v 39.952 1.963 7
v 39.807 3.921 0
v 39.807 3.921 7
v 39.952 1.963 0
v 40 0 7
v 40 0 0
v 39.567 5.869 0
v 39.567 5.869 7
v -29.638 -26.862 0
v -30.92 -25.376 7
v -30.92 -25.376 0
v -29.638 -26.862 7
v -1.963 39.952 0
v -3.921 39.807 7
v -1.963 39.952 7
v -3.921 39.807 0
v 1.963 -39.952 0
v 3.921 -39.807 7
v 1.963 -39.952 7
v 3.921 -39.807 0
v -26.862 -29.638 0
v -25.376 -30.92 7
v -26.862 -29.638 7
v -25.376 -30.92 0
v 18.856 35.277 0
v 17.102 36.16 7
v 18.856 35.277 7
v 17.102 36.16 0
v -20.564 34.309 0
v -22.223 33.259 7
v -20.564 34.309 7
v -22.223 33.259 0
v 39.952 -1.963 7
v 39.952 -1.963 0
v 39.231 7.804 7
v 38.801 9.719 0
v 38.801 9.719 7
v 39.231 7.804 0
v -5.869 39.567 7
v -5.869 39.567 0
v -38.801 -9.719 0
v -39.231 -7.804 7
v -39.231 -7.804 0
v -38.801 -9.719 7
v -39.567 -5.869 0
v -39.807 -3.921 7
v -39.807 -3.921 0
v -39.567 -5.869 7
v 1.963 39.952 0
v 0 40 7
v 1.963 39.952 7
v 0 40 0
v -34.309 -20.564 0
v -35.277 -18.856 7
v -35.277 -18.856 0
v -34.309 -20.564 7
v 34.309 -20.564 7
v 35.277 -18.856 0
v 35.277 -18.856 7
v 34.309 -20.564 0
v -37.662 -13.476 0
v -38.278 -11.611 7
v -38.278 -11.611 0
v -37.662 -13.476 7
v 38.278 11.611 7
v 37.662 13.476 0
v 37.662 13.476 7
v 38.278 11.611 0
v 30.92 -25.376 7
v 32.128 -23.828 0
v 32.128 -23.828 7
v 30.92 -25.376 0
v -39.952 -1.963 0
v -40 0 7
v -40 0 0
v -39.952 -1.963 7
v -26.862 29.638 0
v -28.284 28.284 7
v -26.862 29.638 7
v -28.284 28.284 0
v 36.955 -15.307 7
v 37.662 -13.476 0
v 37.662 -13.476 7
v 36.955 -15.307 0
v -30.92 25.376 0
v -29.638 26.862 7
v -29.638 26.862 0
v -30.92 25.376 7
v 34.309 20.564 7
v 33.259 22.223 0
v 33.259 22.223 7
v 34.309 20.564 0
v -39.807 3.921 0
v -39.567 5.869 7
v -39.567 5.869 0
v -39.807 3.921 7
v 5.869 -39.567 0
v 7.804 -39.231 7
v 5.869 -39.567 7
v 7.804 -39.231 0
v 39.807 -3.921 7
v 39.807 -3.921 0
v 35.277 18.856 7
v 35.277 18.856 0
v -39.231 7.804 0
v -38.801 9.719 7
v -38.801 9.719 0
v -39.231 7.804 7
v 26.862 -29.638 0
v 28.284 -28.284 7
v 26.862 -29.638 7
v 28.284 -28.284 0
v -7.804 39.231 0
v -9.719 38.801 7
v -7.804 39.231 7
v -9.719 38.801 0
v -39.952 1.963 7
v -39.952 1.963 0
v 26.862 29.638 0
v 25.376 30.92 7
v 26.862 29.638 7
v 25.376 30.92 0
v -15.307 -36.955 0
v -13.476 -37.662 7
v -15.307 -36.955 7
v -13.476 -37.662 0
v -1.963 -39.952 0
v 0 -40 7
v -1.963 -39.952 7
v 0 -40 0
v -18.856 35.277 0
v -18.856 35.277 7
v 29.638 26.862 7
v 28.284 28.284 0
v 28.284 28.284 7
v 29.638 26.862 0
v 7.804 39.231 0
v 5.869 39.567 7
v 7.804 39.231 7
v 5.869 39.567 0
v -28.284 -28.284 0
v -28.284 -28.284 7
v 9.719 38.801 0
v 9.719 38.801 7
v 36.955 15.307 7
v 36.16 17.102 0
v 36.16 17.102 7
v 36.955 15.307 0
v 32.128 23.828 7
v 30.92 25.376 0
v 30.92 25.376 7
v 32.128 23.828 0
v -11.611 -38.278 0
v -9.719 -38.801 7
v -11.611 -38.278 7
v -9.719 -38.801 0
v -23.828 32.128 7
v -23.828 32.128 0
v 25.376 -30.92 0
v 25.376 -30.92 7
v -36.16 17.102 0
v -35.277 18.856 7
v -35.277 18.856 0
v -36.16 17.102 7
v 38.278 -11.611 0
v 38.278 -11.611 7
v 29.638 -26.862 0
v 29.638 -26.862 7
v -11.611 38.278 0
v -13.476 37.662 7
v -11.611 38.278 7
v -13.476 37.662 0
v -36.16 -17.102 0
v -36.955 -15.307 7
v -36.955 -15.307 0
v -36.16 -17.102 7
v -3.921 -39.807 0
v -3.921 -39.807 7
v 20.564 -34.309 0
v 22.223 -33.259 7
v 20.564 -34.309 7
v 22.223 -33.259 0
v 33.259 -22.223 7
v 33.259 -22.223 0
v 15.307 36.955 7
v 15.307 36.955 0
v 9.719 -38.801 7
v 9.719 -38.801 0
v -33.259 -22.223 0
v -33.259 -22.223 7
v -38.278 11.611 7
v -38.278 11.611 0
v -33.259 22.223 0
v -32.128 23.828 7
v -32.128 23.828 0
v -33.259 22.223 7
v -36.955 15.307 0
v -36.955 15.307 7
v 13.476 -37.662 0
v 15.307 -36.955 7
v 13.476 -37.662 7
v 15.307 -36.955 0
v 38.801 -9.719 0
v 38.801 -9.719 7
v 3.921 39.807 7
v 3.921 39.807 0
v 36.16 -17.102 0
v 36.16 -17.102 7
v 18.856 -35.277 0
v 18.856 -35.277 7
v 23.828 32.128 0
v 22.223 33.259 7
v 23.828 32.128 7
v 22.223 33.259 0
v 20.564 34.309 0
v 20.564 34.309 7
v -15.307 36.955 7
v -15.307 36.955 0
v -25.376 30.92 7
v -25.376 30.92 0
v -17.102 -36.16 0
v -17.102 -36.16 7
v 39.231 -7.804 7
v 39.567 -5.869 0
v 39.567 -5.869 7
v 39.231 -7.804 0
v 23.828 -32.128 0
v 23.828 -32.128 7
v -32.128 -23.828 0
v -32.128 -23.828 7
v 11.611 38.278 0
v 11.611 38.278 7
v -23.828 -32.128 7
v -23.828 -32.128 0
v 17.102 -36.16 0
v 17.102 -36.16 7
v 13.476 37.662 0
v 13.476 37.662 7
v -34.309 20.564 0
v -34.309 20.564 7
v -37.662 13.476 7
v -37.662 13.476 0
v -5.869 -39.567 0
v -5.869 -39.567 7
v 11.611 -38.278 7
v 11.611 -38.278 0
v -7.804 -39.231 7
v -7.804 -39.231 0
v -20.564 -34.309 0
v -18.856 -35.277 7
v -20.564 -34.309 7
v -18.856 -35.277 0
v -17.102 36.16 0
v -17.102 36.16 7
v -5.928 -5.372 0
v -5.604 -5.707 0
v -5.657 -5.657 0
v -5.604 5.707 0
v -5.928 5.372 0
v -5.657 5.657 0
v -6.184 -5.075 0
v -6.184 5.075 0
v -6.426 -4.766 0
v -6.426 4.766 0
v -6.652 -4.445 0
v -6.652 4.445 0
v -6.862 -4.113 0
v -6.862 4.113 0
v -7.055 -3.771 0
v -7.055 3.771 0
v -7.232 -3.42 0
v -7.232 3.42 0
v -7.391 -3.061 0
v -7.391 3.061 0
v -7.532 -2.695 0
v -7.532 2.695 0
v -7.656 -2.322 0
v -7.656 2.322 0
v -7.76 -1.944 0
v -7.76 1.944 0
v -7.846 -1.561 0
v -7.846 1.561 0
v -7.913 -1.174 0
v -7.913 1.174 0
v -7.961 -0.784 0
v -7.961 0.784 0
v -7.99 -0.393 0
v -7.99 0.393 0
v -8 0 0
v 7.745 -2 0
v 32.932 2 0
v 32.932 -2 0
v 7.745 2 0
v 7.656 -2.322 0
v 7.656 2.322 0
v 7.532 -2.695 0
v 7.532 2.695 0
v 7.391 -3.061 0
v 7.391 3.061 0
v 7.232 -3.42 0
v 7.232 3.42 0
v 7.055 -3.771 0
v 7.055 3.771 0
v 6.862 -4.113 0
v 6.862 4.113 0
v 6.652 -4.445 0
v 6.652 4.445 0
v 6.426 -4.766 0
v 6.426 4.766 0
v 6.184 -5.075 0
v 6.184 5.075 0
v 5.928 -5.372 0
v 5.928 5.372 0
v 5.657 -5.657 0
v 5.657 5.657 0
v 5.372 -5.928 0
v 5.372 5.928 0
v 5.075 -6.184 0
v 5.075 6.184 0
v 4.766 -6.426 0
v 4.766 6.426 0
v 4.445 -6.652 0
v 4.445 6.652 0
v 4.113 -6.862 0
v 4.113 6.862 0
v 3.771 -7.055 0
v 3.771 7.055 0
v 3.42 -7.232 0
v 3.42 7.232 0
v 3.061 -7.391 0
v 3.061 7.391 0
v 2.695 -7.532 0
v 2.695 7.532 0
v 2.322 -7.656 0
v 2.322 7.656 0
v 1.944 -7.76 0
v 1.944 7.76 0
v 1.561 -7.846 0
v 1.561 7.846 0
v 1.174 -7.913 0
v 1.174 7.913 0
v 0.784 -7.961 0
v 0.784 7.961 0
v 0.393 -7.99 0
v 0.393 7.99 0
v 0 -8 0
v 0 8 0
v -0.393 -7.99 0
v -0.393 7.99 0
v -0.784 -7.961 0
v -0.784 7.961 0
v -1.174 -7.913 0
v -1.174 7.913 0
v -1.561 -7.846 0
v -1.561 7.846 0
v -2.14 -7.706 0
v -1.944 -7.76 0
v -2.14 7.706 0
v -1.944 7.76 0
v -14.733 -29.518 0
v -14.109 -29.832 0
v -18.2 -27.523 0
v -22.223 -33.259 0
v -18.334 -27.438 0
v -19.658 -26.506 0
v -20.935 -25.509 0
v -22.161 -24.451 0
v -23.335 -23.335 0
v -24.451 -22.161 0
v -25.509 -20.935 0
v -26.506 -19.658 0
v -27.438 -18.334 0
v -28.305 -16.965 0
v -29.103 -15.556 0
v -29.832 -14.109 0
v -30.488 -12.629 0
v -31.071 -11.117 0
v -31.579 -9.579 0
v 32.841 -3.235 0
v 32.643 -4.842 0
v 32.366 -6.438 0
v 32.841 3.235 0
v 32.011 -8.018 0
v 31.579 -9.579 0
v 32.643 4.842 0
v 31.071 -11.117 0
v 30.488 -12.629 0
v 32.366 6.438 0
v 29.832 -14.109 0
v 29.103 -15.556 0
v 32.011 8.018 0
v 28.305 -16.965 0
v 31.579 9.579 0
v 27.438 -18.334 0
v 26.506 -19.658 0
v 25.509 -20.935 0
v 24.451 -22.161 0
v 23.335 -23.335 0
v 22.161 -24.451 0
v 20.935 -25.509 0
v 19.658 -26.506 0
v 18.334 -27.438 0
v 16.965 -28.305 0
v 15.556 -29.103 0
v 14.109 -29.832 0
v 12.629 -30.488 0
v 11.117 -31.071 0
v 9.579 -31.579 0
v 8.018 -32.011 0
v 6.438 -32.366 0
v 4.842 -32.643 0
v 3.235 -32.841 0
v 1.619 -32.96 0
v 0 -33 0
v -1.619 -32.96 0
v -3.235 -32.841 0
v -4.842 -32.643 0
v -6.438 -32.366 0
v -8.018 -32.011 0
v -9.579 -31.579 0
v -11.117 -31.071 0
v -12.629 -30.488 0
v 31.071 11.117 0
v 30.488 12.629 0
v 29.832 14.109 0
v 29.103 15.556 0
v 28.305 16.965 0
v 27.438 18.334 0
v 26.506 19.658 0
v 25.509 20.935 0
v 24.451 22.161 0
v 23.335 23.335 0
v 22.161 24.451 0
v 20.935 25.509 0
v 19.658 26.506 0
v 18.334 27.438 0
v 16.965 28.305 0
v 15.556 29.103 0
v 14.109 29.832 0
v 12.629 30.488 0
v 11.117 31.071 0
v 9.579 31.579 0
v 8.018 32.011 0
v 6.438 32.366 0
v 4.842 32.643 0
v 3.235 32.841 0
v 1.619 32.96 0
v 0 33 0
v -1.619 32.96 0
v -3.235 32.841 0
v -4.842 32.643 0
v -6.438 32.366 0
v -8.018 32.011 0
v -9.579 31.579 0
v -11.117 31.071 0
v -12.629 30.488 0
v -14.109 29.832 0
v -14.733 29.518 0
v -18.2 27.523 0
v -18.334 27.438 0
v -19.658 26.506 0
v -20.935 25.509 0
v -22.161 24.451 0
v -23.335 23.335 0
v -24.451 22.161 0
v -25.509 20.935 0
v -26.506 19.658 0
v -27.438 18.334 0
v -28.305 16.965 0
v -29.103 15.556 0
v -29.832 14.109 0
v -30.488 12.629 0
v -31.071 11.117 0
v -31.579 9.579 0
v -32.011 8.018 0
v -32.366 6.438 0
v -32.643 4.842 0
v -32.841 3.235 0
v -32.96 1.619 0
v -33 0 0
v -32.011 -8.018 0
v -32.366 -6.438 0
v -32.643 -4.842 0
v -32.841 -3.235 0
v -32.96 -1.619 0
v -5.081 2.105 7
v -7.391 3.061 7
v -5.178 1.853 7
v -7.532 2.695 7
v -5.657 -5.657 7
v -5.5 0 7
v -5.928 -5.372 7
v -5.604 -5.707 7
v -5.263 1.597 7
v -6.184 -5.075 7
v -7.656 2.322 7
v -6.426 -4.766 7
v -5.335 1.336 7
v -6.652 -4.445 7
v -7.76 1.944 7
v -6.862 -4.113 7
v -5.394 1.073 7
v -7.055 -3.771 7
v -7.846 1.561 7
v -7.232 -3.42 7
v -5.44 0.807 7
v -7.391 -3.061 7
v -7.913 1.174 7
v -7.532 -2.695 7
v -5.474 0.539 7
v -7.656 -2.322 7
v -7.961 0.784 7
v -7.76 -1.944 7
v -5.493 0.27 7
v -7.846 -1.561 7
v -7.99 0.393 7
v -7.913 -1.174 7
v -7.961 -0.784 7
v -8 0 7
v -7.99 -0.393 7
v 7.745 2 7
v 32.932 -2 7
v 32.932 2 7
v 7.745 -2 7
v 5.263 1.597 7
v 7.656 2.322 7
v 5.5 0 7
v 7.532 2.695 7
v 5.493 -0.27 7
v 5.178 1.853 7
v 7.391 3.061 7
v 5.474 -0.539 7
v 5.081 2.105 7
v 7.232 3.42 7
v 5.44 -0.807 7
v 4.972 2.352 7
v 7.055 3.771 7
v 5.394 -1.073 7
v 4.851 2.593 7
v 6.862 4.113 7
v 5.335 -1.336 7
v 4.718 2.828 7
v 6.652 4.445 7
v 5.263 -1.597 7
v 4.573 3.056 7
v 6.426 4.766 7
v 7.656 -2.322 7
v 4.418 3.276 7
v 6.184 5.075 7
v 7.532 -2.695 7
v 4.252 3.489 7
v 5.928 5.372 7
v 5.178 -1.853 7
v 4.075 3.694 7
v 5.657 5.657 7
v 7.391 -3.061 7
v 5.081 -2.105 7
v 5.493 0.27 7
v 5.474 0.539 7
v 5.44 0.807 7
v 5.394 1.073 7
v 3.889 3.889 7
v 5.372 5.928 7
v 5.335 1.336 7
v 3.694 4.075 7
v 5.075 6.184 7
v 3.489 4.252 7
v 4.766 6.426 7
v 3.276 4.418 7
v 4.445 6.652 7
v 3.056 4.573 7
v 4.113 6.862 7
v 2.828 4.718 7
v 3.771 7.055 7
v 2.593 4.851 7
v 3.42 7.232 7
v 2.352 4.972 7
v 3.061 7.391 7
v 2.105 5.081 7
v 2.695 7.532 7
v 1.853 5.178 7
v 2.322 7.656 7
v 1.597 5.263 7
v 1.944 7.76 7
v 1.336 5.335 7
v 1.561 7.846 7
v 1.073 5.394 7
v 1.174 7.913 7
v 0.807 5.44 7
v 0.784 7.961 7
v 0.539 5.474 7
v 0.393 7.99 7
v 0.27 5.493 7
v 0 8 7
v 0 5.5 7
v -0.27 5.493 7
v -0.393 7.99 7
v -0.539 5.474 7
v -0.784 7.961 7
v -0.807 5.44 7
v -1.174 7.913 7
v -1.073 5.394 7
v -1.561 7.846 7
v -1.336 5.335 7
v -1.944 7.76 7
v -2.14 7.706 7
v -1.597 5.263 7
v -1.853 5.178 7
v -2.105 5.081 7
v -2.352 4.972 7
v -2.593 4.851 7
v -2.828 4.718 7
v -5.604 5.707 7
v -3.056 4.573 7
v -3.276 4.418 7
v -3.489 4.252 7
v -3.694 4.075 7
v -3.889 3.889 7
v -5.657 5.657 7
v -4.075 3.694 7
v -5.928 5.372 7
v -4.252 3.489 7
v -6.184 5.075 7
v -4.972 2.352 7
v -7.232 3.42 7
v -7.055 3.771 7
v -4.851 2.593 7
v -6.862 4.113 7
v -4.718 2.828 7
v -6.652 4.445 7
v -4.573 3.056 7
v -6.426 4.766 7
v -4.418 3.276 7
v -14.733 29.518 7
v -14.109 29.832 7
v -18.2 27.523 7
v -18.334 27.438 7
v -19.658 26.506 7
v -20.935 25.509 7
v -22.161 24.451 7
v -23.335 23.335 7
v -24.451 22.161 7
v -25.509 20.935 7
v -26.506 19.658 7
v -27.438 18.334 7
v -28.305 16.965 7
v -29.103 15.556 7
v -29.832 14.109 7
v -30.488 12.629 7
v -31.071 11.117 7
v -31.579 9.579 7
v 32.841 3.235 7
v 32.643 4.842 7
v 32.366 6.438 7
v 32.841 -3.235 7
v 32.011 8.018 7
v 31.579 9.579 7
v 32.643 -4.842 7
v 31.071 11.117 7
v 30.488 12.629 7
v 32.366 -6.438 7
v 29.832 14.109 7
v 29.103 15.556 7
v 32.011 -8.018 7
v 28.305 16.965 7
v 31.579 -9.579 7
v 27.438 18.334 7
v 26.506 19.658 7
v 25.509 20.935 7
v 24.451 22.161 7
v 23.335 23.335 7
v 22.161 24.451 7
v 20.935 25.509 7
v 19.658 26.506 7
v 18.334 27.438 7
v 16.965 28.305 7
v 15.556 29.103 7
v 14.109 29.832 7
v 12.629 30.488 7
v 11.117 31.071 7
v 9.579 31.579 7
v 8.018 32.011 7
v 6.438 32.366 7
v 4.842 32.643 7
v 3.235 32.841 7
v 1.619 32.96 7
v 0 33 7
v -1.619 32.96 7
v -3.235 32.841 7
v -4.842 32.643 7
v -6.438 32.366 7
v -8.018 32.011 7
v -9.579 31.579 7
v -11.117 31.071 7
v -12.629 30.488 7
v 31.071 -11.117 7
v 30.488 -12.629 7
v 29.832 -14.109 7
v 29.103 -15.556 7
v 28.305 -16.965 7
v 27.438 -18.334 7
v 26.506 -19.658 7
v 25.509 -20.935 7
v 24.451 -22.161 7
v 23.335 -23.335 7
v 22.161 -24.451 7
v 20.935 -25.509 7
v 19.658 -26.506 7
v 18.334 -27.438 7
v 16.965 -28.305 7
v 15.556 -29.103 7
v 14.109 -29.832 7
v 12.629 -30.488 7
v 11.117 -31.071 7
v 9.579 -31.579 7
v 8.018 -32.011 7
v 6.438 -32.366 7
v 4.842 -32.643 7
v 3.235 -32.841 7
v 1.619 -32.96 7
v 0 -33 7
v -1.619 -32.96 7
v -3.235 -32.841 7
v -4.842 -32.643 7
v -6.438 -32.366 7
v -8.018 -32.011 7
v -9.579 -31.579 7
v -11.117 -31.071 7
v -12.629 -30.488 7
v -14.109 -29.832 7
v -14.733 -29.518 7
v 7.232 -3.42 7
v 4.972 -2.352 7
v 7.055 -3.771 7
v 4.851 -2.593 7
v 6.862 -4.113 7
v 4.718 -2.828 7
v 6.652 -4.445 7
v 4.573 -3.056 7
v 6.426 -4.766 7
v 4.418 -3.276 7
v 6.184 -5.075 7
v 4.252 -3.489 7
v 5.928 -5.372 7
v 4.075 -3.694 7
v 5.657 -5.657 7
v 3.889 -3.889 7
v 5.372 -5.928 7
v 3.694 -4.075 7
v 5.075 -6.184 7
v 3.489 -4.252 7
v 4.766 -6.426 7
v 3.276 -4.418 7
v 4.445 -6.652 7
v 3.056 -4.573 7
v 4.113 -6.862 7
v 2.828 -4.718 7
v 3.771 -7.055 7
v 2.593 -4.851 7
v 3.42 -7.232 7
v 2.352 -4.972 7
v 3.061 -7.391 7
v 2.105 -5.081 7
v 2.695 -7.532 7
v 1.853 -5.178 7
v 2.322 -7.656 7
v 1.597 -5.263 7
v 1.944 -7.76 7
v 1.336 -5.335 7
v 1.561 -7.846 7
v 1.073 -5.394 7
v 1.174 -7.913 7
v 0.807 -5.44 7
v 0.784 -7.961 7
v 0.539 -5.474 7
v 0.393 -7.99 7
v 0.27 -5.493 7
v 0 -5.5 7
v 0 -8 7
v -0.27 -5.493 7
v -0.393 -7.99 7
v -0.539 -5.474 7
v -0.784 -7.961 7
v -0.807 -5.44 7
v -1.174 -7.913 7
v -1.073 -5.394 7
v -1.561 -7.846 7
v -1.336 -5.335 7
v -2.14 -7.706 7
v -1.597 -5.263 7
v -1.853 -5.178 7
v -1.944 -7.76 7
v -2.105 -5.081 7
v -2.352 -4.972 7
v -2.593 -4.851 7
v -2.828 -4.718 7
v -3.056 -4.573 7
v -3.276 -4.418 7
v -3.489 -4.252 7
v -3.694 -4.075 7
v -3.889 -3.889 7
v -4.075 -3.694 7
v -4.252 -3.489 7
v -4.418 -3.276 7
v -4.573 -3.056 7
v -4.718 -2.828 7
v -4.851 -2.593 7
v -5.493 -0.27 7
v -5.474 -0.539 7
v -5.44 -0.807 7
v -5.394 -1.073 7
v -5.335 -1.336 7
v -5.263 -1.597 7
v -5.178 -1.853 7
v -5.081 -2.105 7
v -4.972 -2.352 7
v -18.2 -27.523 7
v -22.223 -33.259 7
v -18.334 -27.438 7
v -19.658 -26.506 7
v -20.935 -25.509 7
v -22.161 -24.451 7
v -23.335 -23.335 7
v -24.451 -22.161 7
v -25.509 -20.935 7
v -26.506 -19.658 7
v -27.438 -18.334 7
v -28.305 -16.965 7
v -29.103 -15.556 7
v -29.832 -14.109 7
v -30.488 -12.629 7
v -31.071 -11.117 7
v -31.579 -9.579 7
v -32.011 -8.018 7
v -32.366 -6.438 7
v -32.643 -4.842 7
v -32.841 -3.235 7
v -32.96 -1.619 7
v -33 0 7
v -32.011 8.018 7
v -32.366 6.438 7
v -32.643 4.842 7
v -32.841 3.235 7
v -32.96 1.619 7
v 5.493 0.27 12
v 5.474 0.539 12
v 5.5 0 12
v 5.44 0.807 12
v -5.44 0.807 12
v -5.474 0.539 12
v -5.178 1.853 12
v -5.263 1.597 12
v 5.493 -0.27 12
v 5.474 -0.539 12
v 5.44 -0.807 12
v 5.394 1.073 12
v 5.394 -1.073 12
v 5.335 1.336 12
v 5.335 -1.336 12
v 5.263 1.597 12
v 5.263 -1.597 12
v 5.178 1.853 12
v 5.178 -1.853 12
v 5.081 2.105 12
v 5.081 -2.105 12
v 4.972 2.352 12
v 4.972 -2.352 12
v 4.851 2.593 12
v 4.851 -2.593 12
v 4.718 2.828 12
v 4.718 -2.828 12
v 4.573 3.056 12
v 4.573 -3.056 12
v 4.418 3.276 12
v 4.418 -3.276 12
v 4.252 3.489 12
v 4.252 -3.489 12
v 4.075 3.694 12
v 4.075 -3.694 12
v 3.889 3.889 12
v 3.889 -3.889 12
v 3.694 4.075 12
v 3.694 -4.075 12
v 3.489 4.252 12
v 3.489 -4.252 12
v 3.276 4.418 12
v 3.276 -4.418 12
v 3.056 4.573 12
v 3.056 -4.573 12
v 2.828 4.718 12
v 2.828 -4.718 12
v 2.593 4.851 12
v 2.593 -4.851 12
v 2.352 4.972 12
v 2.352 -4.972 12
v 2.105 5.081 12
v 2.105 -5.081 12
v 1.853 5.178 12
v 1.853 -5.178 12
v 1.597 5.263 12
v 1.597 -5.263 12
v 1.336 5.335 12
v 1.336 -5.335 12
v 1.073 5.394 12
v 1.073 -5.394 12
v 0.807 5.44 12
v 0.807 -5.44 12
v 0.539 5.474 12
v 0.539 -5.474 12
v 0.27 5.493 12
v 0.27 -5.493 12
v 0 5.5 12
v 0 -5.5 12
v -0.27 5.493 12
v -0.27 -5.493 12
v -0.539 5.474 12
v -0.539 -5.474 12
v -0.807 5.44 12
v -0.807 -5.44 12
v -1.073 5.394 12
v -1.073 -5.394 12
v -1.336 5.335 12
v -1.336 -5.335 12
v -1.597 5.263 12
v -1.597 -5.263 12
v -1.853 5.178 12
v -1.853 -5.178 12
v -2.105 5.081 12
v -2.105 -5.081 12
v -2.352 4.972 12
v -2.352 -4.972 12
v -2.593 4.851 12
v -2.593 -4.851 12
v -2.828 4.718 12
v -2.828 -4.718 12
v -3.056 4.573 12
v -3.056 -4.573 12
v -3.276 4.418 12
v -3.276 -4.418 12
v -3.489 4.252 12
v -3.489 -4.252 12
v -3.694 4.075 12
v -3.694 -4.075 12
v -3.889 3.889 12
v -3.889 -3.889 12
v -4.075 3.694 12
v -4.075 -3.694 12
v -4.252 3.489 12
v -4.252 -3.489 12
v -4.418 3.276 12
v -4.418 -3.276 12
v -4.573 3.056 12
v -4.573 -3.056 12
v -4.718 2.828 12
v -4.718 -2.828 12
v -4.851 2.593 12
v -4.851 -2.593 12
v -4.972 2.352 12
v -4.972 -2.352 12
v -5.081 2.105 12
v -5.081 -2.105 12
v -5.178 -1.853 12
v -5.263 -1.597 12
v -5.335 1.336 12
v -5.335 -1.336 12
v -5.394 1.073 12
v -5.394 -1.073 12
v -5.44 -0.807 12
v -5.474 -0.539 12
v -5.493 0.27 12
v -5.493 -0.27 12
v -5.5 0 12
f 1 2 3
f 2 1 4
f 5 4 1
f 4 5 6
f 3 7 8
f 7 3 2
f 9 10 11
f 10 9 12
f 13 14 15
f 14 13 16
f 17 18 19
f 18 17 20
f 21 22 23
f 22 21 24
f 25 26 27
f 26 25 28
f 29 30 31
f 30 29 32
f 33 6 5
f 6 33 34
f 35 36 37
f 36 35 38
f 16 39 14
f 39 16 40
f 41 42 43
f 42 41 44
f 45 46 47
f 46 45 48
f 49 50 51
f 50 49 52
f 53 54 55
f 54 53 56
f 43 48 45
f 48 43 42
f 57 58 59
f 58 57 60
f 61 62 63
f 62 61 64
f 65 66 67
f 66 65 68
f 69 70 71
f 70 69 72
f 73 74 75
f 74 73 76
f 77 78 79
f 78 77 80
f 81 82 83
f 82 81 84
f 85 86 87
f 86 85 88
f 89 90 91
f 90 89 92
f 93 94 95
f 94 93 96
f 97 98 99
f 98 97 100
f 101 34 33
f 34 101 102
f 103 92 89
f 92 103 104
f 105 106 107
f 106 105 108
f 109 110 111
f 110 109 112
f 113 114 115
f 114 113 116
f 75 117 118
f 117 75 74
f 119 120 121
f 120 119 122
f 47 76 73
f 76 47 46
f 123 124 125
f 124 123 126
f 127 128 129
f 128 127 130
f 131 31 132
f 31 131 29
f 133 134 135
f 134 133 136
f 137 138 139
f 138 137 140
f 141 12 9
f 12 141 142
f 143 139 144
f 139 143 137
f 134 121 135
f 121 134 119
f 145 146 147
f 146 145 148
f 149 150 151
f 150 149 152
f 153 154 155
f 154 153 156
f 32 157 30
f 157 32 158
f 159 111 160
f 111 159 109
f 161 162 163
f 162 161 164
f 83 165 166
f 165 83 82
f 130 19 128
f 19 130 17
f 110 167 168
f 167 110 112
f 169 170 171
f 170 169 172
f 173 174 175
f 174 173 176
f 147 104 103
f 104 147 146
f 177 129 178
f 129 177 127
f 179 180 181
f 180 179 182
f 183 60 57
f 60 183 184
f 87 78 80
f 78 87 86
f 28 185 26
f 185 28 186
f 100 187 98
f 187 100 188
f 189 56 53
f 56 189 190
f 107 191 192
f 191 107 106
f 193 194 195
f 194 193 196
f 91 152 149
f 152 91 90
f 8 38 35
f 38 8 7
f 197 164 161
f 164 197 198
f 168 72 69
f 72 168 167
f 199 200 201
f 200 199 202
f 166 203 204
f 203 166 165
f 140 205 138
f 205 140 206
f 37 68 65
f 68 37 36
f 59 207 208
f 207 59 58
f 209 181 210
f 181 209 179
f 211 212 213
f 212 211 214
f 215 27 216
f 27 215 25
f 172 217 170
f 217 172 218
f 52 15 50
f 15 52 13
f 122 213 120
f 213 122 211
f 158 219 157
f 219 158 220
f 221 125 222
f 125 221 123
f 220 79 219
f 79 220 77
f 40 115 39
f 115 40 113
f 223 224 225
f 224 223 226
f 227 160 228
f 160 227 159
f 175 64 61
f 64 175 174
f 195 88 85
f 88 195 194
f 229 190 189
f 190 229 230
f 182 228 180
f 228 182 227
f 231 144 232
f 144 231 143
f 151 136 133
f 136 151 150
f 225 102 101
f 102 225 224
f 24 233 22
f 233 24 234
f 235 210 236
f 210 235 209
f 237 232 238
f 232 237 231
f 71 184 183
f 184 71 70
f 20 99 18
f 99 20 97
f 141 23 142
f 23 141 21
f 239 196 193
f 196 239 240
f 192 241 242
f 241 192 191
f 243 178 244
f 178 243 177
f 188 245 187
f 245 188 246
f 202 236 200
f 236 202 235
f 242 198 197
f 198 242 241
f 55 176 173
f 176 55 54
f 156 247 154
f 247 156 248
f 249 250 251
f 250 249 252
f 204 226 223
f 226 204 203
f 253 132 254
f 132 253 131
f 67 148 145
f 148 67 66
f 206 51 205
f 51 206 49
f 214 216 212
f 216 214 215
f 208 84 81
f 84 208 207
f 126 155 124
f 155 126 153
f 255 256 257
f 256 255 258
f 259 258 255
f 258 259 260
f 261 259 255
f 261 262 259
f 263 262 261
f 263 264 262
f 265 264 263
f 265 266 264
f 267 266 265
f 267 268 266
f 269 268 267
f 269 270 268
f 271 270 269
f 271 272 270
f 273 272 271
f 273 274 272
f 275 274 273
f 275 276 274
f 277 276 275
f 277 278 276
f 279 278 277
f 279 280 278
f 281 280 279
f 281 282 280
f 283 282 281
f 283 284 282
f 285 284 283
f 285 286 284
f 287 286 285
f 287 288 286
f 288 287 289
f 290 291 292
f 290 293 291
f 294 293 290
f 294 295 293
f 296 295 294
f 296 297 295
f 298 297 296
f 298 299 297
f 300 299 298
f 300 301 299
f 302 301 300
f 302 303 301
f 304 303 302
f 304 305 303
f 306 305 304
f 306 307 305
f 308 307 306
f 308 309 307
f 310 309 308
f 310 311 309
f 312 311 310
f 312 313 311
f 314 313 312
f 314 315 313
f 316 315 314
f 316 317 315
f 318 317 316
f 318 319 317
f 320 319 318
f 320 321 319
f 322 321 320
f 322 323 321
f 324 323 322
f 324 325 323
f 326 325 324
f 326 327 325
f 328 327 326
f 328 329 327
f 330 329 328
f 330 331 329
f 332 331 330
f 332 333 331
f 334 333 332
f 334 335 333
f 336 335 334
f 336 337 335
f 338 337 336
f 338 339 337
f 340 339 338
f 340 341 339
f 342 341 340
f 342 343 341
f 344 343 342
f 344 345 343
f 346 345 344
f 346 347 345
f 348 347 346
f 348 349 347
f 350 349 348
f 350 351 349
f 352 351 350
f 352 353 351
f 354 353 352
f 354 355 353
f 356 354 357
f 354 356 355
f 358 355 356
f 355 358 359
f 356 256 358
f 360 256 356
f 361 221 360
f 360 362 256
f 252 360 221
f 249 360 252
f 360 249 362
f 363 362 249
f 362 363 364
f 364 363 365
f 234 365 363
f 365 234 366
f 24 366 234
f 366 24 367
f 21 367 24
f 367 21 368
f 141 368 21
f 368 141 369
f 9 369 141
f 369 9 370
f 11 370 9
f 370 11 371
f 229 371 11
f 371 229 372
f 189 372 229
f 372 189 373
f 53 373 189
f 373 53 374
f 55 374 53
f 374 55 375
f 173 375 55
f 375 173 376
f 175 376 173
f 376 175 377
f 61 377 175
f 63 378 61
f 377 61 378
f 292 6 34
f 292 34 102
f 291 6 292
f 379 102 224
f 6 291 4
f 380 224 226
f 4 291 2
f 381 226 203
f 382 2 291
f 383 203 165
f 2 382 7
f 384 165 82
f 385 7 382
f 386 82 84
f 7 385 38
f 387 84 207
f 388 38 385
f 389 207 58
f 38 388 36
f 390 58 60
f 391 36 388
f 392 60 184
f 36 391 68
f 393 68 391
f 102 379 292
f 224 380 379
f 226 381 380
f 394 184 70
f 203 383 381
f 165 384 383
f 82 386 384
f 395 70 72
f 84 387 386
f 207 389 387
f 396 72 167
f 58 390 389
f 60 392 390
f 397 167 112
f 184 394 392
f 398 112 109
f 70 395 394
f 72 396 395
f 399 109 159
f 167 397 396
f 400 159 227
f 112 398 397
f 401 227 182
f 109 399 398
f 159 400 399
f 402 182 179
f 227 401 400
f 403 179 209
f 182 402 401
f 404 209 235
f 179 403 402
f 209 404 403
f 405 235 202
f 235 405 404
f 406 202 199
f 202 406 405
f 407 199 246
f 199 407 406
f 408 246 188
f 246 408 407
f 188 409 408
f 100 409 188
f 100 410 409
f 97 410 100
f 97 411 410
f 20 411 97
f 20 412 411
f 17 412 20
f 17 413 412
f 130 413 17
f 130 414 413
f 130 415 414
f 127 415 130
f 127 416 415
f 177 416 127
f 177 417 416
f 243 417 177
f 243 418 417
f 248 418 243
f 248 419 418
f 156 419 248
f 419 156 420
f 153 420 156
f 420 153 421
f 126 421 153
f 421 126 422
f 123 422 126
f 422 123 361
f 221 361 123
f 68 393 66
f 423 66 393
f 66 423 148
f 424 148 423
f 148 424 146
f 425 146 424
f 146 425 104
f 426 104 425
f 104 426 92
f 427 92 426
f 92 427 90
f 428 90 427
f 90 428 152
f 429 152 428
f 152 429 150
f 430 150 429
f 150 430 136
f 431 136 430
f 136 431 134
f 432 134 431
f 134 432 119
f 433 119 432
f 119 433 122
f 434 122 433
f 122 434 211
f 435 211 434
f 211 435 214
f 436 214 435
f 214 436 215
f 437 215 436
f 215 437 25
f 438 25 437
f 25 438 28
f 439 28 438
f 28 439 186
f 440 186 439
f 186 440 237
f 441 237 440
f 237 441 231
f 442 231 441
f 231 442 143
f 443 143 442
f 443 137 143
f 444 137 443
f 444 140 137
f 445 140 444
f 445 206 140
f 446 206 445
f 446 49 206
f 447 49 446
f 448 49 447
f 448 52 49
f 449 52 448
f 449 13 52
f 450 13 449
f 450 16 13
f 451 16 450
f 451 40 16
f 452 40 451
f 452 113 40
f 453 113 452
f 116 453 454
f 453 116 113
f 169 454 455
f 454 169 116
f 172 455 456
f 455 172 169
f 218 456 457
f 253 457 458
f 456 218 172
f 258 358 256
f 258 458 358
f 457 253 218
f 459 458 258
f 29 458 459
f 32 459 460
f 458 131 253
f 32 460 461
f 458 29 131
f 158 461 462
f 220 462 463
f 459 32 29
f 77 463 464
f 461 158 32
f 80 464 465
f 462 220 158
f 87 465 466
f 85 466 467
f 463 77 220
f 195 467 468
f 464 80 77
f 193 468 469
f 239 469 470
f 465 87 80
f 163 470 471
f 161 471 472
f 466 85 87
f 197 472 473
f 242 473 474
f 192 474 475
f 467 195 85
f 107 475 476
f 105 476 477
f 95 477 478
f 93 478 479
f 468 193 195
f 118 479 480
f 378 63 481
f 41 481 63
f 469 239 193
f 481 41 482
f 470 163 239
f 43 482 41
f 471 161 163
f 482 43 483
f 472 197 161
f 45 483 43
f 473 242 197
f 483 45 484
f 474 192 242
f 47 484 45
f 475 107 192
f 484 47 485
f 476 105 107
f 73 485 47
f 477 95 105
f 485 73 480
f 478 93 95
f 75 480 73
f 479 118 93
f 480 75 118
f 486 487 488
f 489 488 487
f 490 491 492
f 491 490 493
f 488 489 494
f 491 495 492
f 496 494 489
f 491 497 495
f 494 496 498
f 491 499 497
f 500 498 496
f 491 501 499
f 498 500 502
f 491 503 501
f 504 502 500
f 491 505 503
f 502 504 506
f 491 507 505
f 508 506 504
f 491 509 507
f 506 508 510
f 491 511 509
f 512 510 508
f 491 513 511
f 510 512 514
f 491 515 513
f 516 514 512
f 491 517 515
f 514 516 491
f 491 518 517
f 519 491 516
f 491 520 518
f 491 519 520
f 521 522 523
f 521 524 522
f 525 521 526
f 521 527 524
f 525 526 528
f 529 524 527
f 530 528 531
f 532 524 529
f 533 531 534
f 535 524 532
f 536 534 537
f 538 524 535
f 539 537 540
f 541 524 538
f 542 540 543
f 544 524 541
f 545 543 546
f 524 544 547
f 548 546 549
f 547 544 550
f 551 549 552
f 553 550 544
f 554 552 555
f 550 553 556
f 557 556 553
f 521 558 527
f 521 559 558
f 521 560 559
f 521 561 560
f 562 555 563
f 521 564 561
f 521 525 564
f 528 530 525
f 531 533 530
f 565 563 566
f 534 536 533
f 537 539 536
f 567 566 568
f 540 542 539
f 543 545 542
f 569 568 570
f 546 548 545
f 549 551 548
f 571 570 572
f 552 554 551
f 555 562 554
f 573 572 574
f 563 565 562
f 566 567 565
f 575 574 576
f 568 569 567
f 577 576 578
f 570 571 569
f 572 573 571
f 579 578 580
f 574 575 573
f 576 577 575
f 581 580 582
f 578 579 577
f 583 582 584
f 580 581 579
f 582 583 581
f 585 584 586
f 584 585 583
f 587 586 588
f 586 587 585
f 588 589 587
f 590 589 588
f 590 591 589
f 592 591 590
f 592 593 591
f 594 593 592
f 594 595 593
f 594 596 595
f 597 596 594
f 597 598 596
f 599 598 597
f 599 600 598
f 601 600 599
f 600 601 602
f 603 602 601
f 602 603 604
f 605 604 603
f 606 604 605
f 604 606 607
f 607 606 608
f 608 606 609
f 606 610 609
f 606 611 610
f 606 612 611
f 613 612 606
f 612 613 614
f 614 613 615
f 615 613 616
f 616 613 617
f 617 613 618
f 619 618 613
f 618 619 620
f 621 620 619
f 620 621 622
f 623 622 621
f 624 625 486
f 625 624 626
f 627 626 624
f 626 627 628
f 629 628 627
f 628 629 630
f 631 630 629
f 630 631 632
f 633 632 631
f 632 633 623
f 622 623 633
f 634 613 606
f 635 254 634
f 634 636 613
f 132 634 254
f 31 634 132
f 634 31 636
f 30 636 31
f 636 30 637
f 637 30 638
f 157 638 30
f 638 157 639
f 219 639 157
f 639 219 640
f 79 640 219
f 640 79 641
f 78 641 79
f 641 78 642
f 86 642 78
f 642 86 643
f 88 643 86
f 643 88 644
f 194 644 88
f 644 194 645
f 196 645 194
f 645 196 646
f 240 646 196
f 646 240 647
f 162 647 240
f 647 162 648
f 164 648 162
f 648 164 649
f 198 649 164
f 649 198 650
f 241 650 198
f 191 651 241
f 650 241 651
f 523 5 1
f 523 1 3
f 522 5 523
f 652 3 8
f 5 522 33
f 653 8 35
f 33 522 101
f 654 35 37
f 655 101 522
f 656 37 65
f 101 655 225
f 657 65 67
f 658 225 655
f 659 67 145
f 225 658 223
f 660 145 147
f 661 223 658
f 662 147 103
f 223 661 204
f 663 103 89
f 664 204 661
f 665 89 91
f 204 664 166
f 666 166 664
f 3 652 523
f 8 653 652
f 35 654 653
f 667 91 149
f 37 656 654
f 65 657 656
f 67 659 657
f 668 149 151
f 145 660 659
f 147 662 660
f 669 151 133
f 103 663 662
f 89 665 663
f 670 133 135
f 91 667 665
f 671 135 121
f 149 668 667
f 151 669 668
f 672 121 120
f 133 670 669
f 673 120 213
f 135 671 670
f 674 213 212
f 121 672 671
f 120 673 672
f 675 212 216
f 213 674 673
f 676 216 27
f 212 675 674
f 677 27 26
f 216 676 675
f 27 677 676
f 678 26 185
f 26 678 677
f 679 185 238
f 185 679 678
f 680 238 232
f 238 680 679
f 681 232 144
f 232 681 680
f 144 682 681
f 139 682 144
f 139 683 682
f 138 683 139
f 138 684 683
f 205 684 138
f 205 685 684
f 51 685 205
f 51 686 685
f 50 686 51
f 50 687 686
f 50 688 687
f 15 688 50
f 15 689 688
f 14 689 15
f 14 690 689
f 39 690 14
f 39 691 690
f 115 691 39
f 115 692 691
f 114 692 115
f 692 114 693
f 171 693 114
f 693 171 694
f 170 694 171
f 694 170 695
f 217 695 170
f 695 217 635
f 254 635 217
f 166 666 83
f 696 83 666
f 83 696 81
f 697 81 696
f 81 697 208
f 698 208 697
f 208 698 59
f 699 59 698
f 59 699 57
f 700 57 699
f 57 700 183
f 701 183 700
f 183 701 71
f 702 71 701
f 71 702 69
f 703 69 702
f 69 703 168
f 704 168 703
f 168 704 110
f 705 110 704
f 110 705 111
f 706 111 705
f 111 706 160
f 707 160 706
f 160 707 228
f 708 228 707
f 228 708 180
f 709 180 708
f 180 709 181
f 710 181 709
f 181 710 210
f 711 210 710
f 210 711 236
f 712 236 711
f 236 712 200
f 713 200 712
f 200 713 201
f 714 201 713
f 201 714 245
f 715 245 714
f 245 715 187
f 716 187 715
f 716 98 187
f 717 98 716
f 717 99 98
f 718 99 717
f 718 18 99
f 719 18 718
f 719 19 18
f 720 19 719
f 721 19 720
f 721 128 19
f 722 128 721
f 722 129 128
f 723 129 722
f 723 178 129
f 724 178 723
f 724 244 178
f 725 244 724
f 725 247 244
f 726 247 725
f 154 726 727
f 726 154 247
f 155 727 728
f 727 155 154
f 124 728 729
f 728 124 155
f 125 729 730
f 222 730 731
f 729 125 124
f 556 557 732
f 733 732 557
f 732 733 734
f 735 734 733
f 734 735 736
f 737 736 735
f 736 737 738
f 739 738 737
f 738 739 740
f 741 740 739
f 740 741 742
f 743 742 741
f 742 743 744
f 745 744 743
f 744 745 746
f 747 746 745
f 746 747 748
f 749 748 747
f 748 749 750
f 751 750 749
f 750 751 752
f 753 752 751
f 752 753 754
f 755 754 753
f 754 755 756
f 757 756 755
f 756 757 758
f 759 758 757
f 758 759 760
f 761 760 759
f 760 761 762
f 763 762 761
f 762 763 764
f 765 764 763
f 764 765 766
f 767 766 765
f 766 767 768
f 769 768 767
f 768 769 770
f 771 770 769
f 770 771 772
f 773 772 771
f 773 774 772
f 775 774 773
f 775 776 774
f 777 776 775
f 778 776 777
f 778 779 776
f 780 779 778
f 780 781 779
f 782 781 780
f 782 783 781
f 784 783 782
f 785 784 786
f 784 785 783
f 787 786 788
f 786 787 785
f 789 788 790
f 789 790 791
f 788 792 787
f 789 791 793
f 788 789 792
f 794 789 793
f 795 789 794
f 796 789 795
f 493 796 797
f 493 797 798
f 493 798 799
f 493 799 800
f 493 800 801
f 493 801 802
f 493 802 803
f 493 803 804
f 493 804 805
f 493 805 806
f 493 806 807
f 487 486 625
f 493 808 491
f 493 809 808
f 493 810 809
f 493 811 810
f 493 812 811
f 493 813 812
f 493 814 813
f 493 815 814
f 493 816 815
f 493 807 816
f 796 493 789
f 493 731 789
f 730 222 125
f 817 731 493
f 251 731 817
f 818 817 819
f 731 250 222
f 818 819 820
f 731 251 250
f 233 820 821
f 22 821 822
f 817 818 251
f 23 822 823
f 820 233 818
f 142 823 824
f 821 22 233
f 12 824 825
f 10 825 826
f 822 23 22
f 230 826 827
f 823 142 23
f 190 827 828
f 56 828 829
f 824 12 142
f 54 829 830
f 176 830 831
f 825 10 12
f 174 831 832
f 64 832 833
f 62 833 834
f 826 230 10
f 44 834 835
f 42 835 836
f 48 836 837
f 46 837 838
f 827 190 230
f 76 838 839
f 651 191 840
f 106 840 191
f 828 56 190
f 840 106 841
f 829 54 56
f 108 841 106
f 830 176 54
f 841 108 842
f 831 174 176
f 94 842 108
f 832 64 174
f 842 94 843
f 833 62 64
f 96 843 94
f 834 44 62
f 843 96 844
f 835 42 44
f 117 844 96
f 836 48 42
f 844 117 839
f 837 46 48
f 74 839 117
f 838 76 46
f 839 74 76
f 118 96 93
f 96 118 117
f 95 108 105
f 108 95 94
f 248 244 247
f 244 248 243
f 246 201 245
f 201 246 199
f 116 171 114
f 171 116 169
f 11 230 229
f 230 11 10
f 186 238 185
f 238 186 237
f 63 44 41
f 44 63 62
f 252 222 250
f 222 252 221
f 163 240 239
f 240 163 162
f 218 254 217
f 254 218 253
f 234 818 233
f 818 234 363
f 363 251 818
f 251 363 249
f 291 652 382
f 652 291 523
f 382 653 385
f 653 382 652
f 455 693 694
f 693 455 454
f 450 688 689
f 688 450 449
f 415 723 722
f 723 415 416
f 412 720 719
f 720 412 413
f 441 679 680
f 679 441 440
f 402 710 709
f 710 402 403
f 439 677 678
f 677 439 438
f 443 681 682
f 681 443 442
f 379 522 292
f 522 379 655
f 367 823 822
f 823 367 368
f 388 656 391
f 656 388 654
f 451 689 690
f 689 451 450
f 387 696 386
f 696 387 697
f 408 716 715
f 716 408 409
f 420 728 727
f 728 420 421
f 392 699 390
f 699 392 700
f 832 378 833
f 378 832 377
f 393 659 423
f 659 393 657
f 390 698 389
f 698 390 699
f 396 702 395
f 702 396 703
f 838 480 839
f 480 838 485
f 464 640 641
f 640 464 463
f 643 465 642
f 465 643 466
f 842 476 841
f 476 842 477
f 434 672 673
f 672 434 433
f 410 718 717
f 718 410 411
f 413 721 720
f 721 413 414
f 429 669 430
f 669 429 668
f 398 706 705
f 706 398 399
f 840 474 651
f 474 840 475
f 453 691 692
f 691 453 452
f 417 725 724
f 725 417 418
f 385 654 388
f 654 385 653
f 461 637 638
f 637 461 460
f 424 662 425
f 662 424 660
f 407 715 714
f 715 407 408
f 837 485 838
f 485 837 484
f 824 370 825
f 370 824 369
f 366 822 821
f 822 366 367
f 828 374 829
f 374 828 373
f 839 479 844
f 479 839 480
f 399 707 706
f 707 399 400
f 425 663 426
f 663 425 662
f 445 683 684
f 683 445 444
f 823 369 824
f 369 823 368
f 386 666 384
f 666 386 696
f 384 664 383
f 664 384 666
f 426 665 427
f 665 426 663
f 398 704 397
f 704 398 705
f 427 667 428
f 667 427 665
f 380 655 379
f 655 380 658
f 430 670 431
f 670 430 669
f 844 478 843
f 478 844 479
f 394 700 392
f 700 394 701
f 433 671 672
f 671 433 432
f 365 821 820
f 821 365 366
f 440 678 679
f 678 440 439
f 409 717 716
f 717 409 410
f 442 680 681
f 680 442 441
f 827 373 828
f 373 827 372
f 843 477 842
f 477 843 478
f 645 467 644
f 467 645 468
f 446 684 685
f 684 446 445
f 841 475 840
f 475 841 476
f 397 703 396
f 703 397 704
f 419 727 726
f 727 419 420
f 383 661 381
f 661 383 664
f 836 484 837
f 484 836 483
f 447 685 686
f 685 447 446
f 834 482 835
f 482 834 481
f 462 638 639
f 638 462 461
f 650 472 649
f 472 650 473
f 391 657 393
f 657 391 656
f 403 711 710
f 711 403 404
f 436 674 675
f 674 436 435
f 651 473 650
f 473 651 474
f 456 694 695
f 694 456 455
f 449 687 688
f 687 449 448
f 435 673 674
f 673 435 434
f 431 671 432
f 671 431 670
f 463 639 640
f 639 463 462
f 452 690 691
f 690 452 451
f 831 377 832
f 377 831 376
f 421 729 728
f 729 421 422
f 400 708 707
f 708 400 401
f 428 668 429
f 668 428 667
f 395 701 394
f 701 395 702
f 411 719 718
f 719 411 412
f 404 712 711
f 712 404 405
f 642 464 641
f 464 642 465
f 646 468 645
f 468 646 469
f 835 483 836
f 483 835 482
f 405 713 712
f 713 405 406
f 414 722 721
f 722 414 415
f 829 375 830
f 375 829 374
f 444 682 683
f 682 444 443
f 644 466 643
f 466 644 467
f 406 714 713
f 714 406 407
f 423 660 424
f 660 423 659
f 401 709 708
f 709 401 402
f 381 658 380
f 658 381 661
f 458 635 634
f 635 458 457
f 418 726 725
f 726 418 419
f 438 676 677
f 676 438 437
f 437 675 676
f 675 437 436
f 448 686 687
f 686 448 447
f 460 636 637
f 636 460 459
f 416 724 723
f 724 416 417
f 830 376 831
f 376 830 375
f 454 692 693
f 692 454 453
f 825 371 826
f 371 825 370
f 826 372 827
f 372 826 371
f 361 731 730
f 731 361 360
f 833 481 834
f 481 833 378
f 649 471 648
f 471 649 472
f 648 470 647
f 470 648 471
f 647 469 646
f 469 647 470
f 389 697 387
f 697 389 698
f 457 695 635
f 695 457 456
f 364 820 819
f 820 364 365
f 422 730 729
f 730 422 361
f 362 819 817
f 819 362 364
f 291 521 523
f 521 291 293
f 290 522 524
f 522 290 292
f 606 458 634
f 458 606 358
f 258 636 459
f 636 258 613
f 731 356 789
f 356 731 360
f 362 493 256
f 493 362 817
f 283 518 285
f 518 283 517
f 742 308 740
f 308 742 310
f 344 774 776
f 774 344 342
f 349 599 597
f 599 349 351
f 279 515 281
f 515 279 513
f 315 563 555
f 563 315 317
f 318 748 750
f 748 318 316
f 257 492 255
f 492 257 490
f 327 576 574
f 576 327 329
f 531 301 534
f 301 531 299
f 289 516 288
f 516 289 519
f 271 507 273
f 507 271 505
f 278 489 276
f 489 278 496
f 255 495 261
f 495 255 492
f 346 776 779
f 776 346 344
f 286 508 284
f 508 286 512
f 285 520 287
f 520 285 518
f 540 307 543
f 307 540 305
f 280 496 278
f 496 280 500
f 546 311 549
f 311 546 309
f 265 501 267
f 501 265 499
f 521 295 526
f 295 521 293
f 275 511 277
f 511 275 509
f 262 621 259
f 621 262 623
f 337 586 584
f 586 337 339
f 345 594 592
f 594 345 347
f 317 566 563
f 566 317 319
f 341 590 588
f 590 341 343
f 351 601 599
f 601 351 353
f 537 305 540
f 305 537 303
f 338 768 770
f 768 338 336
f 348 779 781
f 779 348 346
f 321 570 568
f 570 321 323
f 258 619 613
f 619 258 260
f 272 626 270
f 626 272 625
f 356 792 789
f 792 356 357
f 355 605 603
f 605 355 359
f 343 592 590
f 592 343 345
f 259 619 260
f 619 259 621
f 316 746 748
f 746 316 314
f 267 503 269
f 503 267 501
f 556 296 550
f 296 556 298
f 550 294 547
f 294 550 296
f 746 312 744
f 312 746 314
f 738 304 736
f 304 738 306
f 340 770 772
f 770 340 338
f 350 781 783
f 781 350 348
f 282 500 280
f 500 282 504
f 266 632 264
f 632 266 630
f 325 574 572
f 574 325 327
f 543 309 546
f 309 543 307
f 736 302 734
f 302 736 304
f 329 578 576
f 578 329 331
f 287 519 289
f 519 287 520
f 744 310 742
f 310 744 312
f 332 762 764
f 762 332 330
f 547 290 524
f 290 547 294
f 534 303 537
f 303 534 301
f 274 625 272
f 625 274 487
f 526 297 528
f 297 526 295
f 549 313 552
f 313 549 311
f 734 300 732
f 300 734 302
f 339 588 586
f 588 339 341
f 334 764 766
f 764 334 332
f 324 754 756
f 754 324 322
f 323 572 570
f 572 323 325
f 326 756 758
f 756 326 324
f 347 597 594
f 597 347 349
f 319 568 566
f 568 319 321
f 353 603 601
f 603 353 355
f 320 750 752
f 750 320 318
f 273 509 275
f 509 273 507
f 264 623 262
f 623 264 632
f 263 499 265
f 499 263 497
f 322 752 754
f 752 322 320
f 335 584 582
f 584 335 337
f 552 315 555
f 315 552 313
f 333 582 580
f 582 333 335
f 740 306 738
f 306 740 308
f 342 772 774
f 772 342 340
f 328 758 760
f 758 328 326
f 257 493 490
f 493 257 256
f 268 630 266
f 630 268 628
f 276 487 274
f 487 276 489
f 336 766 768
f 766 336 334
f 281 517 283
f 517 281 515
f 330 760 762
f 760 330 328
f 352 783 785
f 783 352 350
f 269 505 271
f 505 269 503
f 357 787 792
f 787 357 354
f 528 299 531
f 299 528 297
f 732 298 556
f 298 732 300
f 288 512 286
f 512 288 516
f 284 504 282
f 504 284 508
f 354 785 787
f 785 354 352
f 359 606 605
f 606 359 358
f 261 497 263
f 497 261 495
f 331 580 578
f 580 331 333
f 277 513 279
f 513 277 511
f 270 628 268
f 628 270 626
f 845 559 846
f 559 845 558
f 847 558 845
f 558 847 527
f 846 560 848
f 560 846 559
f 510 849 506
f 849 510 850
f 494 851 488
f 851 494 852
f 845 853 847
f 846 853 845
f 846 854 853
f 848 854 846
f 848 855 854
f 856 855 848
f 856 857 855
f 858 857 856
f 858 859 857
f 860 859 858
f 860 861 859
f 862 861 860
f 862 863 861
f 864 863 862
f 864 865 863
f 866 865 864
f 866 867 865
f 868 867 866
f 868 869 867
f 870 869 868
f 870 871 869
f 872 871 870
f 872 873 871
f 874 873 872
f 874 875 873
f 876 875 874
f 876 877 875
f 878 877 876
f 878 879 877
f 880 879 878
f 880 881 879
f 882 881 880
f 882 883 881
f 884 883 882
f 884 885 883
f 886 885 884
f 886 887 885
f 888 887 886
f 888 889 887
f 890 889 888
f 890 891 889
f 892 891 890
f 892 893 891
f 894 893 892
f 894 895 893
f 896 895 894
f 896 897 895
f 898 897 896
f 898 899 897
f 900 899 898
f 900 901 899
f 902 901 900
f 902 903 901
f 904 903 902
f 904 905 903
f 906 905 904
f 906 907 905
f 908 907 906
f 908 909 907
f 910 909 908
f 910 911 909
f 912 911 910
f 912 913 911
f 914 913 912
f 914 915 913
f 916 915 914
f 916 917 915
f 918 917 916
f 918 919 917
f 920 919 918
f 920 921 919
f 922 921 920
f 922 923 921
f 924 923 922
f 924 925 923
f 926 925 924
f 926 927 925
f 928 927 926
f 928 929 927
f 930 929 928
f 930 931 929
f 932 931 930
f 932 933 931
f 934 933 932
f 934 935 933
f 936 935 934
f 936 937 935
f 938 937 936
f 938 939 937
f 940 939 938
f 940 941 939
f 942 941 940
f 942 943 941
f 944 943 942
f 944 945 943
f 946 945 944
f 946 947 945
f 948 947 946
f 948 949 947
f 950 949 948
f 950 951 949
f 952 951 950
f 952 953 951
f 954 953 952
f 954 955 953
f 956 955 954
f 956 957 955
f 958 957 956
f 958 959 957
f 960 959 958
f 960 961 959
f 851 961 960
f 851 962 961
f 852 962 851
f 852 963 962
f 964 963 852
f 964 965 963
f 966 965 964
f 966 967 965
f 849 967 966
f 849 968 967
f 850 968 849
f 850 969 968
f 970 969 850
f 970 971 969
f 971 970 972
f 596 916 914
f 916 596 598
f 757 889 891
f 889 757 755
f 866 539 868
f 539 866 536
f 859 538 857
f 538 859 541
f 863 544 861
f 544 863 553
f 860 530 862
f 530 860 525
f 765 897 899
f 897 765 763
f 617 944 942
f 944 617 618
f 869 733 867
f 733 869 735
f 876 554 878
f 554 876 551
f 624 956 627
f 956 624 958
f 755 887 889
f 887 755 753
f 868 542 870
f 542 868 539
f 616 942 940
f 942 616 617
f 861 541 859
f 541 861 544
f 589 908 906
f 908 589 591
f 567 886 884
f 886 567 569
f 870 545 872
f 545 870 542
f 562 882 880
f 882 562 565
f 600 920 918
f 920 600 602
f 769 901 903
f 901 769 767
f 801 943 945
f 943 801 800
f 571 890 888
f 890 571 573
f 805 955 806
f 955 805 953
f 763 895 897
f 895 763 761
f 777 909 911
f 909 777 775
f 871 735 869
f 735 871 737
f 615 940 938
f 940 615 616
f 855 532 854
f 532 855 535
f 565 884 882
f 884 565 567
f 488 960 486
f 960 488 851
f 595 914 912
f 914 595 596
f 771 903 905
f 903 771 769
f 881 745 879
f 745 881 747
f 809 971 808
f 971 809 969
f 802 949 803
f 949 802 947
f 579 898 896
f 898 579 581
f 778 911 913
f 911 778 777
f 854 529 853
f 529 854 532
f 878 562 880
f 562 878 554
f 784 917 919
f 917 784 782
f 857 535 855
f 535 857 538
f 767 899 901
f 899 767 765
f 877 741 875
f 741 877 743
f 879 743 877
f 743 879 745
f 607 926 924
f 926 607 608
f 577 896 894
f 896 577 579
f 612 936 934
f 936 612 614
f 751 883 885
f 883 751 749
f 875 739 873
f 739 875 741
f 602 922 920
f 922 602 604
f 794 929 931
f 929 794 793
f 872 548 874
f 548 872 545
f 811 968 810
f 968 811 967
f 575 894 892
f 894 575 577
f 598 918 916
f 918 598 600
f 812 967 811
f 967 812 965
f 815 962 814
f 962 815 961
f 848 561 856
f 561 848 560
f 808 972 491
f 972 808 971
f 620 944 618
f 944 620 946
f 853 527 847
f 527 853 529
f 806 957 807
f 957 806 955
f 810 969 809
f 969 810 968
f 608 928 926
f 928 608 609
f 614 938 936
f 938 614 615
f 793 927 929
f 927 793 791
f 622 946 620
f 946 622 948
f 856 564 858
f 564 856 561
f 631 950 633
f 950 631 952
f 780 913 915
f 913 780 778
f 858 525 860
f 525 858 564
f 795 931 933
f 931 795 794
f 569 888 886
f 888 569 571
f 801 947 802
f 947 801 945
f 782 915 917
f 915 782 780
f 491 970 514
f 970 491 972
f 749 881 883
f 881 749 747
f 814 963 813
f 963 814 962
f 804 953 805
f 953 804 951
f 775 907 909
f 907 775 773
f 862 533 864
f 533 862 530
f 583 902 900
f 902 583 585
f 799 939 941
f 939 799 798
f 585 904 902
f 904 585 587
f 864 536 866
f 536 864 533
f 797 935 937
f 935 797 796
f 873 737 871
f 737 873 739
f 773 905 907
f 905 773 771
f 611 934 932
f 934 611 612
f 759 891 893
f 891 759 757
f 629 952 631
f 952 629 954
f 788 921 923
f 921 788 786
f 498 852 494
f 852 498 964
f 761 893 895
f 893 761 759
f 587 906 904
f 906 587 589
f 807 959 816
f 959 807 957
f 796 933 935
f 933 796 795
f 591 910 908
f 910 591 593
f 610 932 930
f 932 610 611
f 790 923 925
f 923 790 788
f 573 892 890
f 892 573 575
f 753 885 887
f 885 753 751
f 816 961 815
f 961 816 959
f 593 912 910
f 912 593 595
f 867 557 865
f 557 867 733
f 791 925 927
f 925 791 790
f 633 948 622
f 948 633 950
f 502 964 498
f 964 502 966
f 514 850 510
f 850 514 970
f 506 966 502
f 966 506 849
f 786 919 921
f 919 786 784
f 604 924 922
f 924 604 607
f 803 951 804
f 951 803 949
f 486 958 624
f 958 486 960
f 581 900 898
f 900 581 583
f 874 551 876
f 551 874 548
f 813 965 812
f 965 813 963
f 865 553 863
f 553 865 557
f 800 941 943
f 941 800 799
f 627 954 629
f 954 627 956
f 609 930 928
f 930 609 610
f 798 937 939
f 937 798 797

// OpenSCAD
$fn = 128;

module wheel(spokeCount = 12) {
    module spoke() {
        translate([0, -2, 0]) cube([38, 4, 7]); 
        }

    union() {
        difference() {
            cylinder(h = 7, r = 40);
            translate([0,0,-1]) cylinder(h = 10, r = 33);
            }

        for (az = [0 : spokeCount])
            rotate([0, 0, az*(360/spokeCount)]) spoke(); 
        
        cylinder(h = 7, r = 8);
        cylinder(h = 12, r = 5.5);
        }
    }

wheel(3);
